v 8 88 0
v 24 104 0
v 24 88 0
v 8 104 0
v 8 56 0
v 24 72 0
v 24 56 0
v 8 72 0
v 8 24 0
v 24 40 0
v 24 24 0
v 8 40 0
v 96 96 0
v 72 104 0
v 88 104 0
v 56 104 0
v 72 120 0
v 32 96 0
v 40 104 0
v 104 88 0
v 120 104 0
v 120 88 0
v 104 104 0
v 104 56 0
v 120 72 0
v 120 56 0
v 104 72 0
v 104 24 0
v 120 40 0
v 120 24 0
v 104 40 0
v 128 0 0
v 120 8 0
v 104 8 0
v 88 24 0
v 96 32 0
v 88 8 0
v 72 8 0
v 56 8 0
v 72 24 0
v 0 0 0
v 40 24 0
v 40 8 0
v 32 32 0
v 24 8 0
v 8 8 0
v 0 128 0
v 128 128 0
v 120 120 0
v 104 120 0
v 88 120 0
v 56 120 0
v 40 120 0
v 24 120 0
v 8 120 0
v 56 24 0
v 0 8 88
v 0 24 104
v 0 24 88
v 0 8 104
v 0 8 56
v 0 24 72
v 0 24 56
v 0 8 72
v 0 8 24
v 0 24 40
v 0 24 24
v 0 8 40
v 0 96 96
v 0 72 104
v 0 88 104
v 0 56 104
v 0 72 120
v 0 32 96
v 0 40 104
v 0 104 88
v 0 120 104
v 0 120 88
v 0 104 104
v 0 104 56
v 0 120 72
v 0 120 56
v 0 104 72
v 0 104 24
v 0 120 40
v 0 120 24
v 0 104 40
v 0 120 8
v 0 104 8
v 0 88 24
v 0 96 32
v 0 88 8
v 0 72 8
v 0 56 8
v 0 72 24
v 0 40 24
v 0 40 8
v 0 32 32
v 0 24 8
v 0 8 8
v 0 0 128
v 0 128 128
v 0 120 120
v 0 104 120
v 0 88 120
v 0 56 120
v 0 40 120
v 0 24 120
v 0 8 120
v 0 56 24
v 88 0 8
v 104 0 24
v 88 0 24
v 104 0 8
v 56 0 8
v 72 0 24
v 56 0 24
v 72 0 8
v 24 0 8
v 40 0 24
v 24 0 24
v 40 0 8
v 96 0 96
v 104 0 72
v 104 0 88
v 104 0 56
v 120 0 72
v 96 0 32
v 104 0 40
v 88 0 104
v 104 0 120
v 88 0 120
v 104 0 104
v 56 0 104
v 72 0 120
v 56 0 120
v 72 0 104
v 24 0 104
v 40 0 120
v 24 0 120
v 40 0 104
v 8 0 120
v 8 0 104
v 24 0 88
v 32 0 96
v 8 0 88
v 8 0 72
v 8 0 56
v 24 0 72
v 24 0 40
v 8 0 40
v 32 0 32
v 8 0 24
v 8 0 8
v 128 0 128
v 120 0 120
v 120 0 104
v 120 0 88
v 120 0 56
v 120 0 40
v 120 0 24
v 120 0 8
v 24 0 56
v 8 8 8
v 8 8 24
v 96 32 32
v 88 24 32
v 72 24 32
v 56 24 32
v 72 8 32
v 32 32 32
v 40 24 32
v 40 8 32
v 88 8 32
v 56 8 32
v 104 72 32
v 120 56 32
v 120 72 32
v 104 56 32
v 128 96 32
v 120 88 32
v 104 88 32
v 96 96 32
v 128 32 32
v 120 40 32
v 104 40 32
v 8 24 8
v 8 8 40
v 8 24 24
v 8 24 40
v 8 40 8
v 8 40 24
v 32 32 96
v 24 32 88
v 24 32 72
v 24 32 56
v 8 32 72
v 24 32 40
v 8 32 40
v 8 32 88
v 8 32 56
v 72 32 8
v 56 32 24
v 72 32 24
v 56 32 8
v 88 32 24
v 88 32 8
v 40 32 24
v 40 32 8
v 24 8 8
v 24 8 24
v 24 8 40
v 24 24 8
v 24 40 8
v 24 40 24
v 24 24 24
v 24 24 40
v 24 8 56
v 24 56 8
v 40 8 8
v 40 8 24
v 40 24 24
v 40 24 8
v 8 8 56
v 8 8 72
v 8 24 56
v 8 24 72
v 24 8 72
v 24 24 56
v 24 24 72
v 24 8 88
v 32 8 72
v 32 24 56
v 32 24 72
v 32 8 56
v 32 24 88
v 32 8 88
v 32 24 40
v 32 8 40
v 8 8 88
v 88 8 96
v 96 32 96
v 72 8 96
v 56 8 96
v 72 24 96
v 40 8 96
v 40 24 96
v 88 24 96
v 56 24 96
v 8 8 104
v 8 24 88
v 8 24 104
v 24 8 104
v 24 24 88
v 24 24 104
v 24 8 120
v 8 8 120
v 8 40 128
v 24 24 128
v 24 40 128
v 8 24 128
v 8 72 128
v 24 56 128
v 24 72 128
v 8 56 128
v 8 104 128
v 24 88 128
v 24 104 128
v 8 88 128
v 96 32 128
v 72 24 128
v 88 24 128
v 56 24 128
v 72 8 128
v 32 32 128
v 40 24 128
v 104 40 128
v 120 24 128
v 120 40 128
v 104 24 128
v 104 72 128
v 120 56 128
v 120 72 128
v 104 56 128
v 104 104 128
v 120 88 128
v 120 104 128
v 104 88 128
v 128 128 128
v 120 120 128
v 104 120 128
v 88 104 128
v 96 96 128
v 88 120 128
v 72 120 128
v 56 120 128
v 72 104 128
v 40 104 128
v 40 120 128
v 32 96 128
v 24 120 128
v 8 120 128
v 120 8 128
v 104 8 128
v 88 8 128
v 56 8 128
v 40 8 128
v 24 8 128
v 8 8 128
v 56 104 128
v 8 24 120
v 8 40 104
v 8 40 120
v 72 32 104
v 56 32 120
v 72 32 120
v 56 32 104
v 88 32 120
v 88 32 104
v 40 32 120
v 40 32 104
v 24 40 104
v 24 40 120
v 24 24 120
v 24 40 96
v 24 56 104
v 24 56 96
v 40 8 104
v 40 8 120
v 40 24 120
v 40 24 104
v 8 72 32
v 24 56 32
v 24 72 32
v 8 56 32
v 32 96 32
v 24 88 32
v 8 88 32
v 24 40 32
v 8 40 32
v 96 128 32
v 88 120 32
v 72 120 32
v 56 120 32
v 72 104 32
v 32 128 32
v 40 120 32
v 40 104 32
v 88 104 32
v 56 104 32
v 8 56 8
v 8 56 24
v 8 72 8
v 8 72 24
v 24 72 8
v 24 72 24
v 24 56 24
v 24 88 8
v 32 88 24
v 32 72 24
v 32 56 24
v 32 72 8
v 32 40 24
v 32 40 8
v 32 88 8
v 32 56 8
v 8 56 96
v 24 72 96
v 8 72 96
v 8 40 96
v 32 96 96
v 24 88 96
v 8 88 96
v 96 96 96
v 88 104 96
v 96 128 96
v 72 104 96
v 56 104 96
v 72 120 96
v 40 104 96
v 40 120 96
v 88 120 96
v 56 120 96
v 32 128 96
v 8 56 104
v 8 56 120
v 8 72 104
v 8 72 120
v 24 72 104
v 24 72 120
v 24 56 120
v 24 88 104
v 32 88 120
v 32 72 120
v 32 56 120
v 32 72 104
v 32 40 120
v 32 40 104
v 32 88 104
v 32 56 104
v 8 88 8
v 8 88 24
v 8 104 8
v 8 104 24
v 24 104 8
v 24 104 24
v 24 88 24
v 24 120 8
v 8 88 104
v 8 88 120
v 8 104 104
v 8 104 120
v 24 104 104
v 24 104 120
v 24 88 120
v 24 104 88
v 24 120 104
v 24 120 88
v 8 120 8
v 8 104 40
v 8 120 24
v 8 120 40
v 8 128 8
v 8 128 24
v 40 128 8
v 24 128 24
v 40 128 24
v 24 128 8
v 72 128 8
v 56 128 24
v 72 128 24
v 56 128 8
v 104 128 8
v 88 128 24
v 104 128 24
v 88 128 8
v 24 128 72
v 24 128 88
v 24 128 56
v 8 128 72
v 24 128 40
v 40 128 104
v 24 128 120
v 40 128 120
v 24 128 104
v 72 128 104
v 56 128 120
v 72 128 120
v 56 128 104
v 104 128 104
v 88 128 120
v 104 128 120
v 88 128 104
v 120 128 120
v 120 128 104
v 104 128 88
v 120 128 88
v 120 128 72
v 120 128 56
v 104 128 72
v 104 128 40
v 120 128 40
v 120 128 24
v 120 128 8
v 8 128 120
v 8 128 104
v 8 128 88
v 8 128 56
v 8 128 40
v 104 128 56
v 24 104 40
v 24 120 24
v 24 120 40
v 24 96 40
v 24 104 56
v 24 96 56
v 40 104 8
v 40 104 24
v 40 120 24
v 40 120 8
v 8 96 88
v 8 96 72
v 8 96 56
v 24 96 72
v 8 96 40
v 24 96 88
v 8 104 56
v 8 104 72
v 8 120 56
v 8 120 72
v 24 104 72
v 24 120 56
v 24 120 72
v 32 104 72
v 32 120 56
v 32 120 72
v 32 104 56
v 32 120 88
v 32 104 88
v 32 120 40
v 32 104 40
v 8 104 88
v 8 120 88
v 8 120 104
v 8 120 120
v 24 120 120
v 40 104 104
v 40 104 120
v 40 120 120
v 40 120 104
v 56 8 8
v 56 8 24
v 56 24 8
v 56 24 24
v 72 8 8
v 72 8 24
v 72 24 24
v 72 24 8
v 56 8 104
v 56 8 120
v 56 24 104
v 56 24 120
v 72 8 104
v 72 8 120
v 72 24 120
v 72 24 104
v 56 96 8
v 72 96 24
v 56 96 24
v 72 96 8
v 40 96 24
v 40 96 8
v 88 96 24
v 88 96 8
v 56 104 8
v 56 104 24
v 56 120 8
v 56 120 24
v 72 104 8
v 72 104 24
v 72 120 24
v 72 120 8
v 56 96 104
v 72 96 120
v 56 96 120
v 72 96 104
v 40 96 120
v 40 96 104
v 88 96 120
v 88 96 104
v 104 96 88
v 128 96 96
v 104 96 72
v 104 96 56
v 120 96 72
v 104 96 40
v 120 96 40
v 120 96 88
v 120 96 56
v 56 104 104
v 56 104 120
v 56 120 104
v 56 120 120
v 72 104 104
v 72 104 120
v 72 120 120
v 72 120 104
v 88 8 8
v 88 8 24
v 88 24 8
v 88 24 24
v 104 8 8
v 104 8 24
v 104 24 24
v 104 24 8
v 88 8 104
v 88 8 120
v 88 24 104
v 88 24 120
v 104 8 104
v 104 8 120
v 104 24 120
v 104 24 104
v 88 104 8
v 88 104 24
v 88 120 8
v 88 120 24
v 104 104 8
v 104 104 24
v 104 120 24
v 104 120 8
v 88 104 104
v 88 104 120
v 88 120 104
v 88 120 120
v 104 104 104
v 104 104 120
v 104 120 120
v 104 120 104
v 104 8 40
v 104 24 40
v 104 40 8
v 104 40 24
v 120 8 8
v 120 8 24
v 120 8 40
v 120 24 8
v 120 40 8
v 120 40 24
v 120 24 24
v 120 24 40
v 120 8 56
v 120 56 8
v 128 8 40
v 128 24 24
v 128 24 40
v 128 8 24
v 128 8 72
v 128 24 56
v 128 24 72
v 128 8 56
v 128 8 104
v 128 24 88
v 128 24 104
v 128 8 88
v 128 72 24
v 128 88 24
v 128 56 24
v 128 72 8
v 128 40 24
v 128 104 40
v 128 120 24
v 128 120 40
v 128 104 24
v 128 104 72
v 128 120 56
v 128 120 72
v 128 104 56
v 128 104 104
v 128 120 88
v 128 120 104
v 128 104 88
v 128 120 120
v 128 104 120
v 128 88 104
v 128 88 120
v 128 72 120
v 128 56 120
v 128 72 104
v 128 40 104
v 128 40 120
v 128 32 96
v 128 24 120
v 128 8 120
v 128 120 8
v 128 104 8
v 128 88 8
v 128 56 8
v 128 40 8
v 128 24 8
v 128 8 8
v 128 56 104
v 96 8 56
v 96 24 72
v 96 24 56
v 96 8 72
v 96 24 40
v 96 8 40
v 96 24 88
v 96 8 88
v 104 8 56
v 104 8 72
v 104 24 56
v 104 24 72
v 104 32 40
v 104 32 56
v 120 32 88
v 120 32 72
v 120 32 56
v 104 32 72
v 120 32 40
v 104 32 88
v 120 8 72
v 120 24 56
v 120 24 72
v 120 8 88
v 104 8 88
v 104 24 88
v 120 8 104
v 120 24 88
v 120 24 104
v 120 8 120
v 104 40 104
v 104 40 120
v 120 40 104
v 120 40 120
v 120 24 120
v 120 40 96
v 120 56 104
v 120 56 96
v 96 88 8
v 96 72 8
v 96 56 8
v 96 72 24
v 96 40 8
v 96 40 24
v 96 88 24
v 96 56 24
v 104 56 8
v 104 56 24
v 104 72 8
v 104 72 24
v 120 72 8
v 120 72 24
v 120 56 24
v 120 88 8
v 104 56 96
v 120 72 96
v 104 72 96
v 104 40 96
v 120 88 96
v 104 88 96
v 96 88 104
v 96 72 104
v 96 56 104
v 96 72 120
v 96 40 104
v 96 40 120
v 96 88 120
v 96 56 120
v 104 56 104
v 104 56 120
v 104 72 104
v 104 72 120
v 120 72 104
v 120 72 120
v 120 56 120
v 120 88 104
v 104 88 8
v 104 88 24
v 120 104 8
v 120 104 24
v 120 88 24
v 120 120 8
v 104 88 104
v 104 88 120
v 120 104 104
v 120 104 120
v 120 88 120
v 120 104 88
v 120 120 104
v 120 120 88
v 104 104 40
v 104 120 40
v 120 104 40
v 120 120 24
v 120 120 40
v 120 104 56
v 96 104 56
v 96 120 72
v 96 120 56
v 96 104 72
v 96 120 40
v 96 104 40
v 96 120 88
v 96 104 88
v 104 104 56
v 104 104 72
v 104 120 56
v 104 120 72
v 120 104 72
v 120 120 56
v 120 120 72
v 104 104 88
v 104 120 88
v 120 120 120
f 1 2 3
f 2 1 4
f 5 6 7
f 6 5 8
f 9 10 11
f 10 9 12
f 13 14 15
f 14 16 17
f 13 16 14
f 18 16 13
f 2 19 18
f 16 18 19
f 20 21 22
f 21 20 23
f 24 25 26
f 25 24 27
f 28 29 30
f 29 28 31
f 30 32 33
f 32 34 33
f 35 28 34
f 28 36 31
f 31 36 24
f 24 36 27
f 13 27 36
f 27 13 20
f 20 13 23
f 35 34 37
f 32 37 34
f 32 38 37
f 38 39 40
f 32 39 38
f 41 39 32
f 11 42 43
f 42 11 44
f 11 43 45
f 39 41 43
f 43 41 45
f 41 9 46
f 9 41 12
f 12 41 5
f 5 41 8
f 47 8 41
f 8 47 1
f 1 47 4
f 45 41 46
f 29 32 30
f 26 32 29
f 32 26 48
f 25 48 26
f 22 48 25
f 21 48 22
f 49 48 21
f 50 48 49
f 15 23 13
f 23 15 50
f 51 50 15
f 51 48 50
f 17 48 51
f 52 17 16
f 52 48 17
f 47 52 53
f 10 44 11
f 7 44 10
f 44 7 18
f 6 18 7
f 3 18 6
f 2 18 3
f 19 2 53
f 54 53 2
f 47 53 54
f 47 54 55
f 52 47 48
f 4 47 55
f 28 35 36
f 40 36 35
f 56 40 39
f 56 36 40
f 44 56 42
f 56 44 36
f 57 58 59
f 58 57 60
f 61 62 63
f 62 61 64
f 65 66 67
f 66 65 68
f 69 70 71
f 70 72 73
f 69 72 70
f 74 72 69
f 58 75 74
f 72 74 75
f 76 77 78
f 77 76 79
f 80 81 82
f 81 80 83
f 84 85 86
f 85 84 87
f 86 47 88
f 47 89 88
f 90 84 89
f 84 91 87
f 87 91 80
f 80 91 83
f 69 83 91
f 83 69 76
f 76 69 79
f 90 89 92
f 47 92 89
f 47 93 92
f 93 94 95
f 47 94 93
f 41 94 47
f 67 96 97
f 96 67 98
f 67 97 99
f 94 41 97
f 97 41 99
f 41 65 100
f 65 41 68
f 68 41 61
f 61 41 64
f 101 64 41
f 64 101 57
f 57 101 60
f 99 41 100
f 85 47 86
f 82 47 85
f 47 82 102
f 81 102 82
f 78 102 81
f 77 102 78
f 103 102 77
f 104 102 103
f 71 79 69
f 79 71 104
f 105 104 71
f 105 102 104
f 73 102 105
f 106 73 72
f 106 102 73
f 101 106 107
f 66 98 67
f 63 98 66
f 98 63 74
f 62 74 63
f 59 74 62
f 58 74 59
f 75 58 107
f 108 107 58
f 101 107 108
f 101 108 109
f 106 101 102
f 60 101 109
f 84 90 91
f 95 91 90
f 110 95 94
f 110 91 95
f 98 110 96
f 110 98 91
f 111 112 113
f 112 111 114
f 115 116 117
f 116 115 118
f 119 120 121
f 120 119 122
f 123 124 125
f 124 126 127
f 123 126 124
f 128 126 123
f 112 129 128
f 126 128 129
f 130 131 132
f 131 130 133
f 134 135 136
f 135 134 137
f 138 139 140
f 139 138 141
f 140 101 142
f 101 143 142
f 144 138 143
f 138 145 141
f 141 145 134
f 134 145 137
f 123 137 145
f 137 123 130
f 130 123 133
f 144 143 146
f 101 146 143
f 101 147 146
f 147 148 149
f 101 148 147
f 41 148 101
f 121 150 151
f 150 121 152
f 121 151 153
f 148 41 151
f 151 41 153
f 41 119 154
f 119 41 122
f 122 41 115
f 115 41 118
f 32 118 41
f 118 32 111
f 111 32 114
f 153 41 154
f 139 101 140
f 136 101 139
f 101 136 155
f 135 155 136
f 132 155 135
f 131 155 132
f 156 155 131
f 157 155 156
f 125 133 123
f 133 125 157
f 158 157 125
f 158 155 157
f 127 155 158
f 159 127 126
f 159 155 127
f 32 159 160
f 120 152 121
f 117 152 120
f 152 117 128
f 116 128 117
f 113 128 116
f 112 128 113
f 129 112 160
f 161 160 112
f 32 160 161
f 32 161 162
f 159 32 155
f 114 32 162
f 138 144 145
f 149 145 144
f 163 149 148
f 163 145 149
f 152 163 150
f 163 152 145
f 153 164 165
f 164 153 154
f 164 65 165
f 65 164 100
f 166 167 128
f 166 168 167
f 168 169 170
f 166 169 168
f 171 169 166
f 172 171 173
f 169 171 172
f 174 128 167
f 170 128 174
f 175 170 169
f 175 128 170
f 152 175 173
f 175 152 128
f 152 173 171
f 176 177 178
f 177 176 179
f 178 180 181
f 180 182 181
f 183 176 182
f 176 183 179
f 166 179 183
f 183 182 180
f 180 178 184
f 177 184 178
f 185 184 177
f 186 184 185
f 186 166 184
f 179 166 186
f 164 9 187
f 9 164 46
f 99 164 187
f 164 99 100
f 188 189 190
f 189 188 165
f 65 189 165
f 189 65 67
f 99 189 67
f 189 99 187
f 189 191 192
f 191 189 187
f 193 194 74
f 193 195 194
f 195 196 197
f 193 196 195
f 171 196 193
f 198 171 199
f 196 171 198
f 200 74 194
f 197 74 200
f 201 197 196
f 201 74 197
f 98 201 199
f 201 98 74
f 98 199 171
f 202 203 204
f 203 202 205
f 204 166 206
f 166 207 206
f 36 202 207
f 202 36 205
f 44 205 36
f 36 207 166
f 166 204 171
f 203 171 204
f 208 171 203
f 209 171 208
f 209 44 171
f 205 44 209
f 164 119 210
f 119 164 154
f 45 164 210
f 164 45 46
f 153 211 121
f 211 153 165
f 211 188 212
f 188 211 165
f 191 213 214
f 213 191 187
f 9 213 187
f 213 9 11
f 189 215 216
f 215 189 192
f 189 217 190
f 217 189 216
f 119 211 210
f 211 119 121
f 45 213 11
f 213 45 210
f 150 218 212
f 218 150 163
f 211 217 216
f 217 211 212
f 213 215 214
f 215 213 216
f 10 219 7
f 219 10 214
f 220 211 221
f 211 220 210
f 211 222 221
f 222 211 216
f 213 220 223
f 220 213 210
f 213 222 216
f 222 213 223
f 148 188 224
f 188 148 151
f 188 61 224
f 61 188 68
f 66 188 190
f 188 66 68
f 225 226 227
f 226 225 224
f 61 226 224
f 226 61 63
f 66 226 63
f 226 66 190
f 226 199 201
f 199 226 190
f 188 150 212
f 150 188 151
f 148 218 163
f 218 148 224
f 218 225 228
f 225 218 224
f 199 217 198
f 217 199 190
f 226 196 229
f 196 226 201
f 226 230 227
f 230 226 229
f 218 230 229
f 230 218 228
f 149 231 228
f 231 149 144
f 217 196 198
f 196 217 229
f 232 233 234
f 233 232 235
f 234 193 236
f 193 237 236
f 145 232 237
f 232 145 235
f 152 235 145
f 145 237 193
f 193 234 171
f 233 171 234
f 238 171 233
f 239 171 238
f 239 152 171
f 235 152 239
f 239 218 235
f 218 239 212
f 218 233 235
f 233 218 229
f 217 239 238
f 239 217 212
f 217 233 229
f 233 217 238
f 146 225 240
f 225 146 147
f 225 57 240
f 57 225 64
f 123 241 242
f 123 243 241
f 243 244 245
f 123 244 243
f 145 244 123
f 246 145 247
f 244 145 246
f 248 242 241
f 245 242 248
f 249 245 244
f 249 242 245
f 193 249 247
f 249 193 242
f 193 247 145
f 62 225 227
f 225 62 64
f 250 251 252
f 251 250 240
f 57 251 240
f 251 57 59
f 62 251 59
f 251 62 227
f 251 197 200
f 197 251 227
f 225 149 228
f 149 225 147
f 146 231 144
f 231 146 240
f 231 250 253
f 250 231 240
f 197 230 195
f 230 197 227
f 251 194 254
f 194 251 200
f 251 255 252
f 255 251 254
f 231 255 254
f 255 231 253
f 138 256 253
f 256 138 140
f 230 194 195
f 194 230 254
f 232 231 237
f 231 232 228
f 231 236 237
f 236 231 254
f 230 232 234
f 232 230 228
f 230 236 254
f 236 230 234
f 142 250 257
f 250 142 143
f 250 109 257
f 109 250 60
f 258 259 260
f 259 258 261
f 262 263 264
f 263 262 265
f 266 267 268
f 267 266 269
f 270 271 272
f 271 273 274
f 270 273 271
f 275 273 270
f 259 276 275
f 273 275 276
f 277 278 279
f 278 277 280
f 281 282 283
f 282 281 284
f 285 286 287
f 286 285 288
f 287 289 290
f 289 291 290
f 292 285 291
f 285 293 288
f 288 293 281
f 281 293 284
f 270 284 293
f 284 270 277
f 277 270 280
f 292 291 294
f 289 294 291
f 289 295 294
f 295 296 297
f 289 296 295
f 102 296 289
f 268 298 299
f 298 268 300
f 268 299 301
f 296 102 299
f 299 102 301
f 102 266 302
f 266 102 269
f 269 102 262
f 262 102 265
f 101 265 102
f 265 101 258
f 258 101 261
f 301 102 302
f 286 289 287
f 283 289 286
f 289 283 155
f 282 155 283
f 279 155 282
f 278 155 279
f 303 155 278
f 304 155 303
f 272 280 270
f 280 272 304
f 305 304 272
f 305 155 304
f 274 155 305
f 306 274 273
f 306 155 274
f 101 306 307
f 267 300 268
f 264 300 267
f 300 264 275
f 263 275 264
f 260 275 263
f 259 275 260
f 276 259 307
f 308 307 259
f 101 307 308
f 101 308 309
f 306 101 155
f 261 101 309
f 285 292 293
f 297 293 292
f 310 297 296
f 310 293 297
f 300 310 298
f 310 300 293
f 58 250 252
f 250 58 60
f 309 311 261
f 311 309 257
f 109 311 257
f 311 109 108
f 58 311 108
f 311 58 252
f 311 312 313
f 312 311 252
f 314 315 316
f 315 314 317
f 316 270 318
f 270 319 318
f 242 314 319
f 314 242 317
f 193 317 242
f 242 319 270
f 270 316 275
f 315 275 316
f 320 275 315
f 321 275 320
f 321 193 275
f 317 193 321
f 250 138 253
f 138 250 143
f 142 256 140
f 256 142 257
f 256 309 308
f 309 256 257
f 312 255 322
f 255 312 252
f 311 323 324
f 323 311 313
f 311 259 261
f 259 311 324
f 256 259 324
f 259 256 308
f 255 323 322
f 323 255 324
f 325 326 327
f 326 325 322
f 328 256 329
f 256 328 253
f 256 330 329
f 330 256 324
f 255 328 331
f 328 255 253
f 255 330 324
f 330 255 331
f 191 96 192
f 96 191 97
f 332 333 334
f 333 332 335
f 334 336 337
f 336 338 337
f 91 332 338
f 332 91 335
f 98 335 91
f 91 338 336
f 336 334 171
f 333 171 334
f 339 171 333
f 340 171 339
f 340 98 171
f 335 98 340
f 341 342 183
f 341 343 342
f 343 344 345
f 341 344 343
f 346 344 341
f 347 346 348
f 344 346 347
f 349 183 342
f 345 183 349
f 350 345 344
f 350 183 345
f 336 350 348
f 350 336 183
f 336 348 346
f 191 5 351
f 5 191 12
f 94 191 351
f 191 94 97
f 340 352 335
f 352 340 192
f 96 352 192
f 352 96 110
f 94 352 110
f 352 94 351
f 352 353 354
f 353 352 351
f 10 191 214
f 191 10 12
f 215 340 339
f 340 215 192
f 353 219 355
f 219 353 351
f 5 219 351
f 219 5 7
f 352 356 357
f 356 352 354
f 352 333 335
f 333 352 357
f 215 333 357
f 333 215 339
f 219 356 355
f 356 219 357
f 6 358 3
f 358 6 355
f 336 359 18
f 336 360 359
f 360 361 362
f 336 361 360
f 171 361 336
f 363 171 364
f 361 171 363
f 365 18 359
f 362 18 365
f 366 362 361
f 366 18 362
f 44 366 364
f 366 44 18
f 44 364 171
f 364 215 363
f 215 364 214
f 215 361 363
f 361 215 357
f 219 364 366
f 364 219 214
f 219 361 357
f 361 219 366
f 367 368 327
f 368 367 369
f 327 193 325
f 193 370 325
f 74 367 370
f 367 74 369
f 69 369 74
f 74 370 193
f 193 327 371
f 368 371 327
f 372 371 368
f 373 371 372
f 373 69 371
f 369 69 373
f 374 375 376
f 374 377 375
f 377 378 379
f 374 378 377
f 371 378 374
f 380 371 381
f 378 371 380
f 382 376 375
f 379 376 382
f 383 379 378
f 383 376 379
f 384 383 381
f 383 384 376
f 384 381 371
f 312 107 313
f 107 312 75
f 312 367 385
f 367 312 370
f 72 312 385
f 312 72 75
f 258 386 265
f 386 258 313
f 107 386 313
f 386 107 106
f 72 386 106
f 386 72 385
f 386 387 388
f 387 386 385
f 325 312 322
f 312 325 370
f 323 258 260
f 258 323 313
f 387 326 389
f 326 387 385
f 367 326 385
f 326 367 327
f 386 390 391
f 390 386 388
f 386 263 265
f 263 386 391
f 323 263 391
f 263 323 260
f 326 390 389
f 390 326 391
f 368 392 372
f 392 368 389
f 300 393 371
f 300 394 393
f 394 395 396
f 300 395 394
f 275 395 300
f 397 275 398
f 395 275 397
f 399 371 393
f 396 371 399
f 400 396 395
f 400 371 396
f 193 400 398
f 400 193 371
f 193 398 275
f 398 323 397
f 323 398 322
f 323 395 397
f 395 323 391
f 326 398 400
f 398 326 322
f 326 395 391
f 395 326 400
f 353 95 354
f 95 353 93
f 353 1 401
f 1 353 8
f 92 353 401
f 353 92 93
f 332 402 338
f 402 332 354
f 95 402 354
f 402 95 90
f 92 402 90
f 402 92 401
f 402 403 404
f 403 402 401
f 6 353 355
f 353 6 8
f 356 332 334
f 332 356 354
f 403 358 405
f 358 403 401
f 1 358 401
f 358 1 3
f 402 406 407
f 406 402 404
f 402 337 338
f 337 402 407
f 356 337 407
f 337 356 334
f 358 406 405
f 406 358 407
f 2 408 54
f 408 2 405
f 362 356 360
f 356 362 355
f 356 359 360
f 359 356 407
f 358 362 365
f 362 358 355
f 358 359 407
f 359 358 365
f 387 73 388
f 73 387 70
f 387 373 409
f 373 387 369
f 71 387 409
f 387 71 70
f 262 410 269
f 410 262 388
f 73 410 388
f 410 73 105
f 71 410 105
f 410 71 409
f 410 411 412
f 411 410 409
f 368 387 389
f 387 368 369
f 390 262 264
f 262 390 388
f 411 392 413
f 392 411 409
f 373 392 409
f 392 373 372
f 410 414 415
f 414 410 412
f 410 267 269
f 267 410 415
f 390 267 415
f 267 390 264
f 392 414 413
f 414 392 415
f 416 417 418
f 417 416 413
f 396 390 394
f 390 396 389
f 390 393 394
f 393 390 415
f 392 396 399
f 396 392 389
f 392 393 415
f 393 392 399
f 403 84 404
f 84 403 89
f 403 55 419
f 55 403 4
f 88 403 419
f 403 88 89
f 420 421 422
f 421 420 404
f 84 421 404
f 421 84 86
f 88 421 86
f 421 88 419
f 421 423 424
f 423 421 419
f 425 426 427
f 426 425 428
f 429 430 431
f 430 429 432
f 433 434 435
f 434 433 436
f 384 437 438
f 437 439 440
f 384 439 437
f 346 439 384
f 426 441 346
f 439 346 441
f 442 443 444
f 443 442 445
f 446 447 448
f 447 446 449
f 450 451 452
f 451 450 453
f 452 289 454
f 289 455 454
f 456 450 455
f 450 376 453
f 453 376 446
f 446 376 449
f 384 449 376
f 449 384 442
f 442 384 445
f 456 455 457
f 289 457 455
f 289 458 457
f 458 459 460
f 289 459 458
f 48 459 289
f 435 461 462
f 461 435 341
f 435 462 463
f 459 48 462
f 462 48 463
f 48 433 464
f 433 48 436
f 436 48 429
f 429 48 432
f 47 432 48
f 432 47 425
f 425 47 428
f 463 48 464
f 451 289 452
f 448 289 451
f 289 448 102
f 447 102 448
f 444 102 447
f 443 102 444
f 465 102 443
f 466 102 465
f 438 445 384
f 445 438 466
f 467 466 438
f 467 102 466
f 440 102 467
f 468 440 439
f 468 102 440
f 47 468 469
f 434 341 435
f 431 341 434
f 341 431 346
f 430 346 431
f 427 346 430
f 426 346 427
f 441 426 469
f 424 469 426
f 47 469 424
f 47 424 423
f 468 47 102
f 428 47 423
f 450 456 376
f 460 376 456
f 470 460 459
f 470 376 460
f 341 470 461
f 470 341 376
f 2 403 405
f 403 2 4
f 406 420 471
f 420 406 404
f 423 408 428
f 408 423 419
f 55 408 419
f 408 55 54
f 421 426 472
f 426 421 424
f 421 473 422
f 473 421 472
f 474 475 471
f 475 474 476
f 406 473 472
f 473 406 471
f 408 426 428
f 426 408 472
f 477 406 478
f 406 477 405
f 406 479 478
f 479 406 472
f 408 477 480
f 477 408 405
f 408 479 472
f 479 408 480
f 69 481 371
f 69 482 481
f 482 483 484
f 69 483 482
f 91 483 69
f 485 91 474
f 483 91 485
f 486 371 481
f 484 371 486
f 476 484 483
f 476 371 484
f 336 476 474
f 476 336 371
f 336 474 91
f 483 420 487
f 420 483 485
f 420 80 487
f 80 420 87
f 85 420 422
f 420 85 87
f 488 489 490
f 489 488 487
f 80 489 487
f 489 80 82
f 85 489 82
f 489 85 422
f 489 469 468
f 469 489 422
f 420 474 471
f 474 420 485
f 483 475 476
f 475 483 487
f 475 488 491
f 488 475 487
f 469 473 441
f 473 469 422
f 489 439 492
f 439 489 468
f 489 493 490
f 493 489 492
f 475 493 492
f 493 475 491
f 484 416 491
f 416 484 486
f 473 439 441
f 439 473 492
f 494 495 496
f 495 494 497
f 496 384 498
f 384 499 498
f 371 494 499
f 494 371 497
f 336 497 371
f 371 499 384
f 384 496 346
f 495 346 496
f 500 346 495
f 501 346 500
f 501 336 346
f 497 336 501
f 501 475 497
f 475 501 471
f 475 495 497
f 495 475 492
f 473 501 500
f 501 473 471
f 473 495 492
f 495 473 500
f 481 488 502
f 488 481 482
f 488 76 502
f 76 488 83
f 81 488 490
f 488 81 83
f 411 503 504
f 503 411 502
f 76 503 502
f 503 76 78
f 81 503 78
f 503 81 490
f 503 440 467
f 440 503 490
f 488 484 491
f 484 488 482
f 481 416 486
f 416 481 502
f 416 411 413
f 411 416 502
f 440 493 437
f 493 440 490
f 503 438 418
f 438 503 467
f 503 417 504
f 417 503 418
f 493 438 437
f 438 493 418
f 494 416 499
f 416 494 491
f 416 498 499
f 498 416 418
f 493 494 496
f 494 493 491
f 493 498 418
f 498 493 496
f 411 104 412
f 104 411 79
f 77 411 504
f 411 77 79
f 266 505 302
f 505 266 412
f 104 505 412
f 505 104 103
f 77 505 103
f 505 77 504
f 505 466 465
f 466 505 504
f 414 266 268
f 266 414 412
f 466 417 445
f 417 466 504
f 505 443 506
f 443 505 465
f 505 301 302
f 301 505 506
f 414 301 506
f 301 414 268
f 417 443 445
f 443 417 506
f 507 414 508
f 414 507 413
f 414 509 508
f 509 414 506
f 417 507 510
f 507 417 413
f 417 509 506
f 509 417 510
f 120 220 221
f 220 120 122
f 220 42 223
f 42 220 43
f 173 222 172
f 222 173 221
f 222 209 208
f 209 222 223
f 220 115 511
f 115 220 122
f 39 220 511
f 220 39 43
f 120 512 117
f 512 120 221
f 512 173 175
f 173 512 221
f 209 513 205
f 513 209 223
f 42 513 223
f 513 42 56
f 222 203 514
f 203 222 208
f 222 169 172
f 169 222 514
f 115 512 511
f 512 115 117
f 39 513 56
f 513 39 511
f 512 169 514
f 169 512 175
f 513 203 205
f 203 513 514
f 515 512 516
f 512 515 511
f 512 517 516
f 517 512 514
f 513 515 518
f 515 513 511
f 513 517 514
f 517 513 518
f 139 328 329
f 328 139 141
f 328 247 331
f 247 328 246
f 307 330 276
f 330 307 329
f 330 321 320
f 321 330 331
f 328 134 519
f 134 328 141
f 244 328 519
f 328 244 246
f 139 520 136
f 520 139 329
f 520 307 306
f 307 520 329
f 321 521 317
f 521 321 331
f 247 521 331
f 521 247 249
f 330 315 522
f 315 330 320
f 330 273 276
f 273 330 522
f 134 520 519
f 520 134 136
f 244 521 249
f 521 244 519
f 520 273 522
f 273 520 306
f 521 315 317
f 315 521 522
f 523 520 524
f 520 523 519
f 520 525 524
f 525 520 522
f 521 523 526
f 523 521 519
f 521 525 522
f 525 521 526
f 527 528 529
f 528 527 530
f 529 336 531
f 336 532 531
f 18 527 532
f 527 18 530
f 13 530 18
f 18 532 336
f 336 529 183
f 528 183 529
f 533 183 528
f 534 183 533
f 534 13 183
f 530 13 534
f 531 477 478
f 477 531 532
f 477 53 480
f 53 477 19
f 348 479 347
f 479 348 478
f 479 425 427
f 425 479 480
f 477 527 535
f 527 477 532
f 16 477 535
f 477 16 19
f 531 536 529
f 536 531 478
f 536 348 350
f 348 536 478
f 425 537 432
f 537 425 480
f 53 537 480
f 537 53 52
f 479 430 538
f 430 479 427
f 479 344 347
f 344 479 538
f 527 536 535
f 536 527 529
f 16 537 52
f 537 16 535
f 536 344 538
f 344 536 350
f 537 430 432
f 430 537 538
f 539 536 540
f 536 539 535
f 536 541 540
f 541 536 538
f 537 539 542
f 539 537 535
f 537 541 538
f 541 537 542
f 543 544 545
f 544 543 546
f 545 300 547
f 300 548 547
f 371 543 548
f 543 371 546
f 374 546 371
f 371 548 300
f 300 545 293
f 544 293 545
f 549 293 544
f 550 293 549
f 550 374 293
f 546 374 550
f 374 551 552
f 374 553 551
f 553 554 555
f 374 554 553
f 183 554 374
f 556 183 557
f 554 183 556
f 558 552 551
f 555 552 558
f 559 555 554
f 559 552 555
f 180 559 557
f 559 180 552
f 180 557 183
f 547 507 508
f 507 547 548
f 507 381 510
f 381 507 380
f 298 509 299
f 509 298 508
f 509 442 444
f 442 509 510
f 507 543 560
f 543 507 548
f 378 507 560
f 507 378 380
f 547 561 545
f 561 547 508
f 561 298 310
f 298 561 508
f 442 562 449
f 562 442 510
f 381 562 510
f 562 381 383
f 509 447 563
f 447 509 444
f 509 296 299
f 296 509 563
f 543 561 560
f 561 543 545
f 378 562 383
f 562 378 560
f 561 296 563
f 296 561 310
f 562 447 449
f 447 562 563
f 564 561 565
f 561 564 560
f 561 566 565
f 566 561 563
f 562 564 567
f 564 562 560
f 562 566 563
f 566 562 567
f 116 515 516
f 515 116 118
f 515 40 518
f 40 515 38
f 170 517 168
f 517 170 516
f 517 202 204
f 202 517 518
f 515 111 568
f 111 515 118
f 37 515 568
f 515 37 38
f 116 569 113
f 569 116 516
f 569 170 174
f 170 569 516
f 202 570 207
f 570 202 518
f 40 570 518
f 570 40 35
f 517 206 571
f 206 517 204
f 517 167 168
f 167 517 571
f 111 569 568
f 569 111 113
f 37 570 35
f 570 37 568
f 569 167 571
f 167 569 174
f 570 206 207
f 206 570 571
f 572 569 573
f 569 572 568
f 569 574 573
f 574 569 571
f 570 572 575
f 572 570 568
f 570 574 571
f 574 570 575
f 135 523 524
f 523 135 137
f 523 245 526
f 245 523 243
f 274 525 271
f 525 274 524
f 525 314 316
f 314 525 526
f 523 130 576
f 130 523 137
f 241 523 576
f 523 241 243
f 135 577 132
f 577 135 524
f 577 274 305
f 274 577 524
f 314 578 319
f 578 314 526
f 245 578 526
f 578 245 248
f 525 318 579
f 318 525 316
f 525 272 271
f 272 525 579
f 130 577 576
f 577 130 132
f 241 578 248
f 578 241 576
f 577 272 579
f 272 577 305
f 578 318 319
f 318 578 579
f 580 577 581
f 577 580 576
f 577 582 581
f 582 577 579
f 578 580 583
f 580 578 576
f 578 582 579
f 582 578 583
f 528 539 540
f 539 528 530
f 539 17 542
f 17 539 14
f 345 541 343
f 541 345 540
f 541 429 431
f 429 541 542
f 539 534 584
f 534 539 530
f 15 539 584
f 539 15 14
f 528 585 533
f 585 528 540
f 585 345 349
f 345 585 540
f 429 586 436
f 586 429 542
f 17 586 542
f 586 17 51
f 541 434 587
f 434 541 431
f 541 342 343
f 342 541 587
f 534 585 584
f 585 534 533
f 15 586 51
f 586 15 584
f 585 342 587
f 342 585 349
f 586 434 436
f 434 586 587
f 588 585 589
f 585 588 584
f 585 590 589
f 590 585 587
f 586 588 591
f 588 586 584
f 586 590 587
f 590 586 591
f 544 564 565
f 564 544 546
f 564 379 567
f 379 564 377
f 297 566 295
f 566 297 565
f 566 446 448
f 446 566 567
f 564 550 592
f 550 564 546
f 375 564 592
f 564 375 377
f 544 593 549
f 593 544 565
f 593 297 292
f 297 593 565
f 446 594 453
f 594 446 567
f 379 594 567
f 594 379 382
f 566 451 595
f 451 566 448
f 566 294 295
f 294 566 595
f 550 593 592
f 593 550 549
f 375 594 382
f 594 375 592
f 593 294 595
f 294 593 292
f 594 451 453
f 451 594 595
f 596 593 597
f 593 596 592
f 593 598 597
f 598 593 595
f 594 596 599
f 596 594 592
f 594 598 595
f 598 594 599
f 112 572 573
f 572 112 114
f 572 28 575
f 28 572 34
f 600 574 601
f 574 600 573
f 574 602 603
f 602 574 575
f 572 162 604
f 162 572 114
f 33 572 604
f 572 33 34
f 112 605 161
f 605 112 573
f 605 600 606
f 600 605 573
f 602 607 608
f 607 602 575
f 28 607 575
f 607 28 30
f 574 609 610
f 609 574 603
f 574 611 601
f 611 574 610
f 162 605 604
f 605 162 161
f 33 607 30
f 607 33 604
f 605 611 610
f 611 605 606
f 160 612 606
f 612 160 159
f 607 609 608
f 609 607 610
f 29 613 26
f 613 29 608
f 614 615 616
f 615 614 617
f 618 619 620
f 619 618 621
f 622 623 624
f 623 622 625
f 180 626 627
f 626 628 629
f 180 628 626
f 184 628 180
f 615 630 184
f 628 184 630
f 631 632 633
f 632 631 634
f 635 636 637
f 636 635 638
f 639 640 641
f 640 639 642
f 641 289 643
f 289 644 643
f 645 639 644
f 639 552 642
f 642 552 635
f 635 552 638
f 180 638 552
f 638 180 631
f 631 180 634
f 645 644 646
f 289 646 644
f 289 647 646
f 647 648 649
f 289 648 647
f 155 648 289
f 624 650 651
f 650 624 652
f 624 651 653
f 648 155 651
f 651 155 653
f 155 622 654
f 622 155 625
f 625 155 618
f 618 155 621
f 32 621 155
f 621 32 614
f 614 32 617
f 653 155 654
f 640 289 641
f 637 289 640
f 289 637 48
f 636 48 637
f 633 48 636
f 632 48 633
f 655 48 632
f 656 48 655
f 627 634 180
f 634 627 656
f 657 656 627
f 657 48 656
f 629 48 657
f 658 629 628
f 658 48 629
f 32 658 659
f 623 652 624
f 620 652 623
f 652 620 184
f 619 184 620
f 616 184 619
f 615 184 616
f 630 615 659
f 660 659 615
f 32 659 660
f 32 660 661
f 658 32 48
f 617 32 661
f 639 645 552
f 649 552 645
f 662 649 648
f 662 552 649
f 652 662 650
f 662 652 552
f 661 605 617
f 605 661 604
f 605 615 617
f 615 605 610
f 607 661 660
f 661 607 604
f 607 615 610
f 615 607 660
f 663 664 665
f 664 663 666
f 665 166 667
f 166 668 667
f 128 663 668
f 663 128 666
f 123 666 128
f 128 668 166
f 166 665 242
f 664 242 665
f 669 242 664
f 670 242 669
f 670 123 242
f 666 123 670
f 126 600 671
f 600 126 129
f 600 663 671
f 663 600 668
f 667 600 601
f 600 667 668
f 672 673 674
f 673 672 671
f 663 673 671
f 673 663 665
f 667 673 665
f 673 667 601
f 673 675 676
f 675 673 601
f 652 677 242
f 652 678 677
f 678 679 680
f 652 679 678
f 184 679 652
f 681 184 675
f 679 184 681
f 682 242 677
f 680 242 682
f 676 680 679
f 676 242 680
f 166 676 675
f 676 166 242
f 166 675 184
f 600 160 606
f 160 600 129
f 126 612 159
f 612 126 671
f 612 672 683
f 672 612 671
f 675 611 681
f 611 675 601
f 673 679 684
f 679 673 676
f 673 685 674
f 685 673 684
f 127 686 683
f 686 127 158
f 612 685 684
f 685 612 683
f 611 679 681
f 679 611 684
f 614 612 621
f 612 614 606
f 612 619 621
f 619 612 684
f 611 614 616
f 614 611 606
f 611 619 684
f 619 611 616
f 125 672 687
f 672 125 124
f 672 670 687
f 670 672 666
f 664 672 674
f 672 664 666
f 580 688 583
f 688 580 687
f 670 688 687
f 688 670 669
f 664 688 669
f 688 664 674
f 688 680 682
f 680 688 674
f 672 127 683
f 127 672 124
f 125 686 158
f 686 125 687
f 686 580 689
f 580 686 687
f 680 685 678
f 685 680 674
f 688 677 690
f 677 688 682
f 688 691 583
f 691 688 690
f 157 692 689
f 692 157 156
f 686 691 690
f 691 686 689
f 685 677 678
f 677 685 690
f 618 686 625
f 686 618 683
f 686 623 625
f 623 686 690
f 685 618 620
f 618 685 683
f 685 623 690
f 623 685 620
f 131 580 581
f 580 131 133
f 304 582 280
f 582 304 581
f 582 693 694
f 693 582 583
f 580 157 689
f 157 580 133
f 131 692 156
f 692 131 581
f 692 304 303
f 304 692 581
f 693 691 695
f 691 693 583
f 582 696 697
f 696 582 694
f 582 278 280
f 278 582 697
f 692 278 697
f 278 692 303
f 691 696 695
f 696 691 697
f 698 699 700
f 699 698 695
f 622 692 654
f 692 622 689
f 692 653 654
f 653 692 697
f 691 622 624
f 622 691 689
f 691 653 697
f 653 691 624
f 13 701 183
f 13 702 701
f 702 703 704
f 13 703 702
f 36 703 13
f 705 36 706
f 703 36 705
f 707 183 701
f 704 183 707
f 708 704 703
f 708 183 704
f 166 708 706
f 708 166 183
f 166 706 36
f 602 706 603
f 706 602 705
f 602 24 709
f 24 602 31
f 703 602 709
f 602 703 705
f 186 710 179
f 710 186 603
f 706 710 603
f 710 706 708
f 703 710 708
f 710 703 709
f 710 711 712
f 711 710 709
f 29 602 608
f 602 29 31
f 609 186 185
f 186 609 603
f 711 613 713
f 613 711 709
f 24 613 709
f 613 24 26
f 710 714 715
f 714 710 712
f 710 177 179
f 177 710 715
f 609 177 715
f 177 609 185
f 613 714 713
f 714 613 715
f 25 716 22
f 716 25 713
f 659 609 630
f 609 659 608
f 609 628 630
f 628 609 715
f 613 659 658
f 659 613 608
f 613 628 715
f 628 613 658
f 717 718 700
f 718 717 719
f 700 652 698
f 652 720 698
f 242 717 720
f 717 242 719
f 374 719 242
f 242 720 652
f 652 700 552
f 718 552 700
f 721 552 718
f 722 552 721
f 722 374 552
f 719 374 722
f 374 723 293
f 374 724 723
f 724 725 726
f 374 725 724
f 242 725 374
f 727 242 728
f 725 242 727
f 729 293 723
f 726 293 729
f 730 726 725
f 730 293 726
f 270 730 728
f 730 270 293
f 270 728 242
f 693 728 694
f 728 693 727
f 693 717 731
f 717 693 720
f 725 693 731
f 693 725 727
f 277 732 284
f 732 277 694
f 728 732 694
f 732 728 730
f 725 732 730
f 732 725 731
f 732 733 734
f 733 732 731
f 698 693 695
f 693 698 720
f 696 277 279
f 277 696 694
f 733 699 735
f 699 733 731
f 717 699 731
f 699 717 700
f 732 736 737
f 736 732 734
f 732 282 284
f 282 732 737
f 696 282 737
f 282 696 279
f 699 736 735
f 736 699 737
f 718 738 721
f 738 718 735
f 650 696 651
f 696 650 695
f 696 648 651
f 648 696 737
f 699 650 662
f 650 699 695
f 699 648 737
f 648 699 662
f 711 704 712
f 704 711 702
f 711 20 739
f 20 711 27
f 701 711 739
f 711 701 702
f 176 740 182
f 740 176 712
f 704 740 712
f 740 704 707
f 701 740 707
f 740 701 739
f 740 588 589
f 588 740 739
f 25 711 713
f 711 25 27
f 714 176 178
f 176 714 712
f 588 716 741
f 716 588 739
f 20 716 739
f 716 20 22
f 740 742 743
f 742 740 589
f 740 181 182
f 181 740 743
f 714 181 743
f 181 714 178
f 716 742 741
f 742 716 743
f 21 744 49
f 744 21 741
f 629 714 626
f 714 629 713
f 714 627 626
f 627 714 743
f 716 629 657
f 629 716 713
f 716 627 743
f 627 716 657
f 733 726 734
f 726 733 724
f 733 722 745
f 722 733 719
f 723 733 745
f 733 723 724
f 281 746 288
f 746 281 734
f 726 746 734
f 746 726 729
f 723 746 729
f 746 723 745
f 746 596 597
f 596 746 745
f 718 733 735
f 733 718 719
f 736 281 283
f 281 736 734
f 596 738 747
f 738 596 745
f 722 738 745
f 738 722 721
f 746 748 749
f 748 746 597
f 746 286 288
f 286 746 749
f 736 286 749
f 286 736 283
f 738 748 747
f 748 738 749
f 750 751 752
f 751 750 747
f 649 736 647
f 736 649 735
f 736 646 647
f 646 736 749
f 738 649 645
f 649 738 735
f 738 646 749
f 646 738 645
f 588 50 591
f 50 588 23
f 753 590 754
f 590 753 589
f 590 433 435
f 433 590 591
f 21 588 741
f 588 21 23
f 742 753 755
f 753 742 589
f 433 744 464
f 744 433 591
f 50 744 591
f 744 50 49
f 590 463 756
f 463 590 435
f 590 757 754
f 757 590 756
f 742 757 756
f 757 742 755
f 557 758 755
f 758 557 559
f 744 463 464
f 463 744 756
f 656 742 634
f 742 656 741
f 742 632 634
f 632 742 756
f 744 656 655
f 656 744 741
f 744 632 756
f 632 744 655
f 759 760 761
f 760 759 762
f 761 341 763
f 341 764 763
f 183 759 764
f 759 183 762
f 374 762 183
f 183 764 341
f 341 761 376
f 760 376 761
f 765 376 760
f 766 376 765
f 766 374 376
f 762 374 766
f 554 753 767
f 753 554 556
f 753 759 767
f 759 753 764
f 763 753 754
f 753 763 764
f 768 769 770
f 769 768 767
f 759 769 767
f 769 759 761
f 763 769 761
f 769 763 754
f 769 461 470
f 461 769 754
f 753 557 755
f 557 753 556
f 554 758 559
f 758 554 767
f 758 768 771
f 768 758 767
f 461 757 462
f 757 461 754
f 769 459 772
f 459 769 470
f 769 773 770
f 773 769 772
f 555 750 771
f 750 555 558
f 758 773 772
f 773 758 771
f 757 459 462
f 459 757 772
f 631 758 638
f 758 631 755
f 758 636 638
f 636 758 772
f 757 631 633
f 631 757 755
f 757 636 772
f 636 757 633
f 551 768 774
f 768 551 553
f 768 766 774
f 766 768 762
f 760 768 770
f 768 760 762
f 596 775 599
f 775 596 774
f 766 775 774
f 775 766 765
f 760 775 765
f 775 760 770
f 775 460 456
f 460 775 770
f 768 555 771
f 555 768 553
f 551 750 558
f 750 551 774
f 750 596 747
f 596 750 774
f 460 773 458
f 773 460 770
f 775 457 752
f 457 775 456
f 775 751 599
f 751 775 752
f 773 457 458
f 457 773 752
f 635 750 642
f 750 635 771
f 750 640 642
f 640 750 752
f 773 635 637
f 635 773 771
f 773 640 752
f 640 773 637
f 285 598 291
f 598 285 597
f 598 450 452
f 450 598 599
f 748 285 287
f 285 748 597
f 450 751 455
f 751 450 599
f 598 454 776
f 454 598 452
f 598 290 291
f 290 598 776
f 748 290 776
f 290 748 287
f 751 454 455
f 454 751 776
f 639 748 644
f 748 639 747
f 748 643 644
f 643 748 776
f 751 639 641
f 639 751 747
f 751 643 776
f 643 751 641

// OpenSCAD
// How deep to recurse the fractal
depth = 2;

// Size of the fractal bounding box
edge = 128;

// Defines the fractal stencil to be a cube of this size
stencilSize = 4;

// Following taken from the Tips & Tricks page
function CountVals(i,arr) = len( [for (x=arr) if(x==i) x ]);

/*
  Define the fractal
  This function gets called with arguments in the
  range
  0 <= arg < stencilSize
  to see if the recursion should continue. Changing
  this function will change the generated fractal
*/
function CheckStencil(rx,ry,rz) = 
    let( count1 = CountVals(1,[rx,ry,rz]) )
    let( count2 = CountVals(2,[rx,ry,rz]) )
    (count1+count2) < 2;

/*
  Draws the fractal. If the maximum depth
  has been reached, draw a cube at the indicated
  location. Otherwise, split the cube up by
  stencilSize, and use CheckStencil to see if
  recusion should be continued into each sub-cube
*/
module DrawFractal(currentDepth,x,y,z,scale) {
    if( currentDepth==0 ) {
        translate([x,y,z])
            cube(scale*stencilSize);
    }
    else {
        for( i=[0:stencilSize-1],
             j=[0:stencilSize-1],
             k=[0:stencilSize-1] ) {
            if( CheckStencil(i,j,k) ) {
                DrawFractal(currentDepth-1,
                            x + i*scale,
                            y + j*scale,
                            z + k*scale,
                            scale/stencilSize);
            }
        }
    }
}

// Drive the entire program
DrawFractal(depth,0,0,0,edge/stencilSize);
